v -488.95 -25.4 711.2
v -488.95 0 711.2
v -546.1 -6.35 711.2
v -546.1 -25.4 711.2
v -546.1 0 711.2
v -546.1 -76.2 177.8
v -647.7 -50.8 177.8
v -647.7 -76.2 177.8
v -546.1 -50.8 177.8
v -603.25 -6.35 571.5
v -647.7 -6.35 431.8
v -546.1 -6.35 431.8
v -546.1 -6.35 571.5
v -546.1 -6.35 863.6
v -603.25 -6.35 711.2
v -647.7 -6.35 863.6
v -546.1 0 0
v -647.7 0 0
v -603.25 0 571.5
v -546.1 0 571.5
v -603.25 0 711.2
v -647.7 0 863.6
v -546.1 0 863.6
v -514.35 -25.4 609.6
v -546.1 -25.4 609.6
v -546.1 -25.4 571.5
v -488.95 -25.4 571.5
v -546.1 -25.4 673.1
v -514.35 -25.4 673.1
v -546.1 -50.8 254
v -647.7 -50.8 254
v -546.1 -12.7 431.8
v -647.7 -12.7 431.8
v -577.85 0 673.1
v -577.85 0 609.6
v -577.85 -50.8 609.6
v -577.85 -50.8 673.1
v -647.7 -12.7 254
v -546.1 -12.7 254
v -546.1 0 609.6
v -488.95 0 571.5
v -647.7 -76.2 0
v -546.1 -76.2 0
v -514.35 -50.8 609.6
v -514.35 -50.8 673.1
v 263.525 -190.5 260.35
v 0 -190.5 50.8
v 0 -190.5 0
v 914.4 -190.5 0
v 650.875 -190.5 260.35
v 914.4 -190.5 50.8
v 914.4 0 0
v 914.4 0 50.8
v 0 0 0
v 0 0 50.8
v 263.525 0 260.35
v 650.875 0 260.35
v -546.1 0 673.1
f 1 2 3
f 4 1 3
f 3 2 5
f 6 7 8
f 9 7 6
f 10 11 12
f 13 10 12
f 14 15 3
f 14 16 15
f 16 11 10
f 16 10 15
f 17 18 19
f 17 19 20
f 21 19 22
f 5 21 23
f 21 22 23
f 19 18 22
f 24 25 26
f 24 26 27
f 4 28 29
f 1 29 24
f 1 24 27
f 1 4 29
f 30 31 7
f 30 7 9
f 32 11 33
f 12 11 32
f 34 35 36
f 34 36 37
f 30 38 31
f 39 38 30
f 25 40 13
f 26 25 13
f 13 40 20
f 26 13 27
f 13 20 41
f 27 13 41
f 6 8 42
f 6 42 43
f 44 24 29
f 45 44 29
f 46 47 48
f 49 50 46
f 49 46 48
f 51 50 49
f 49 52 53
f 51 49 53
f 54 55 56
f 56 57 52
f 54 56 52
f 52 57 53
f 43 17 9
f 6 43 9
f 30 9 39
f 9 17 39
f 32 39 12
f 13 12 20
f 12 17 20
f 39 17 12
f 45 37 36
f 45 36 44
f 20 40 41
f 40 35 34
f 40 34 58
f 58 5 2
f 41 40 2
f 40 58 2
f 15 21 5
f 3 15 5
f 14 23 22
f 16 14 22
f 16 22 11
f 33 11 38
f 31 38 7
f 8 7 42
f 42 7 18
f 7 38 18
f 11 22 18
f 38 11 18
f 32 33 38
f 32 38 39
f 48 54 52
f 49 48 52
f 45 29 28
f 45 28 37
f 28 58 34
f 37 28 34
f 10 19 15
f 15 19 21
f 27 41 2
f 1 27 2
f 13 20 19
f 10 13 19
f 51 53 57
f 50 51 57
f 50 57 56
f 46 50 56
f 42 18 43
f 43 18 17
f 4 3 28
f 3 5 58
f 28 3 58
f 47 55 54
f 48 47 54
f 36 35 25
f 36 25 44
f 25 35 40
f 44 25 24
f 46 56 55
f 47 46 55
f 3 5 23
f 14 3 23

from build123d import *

# Parameters (mm, degrees)
F1_DEPTH = 190.5
F0_W     = 101.6
F0_H     = 177.8
F2_DEPTH = 76.2
F0_H_2   = 76.2
F3_DEPTH = 50.8
F4_DEPTH = 12.7
F5_DEPTH = 6.35
F0_W_2   = 31.75
F0_H_3   = 63.5
F6_DEPTH = 50.8
F7_DEPTH = 25.4


with BuildPart() as f1:
    # F0 (on Front) → F1 (new body)
    with BuildSketch(Plane.XZ):
        Polygon((0, 50.8), (0, 0), (914.4, 0), (914.4, 50.8), (650.875, 260.35), (263.525, 260.35), align=None)
    extrude(amount=F1_DEPTH)


with BuildPart() as f2:
    # F0 (on Front) → F2 (new body)
    with BuildSketch(Plane.XZ):
        with Locations((-596.9, 88.9)):
            Rectangle(F0_W, F0_H)
    extrude(amount=F2_DEPTH)

    # F0 (on Front) → F3 (join)
    with BuildSketch(Plane.XZ):
        with Locations((-596.9, 215.9)):
            Rectangle(F0_W, F0_H_2)
    extrude(amount=F3_DEPTH)

    # F0 (on Front) → F4 (join)
    with BuildSketch(Plane.XZ):
        with Locations((-596.9, 342.9)):
            Rectangle(F0_W, F0_H)
    extrude(amount=F4_DEPTH)

    # F0 (on Front) → F5 (join)
    with BuildSketch(Plane.XZ):
        Polygon((-647.7, 431.8), (-546.1, 431.8), (-546.1, 571.5), (-603.25, 571.5), (-603.25, 711.2), (-546.1, 711.2), (-546.1, 863.6), (-647.7, 863.6), align=None)
    extrude(amount=F5_DEPTH)



with BuildPart() as f6:
    # F0 (on Front) → F6 (new body)
    with BuildSketch(Plane.XZ):
        with Locations((-530.225, 641.35)):
            Rectangle(F0_W_2, F0_H_3)
        with Locations((-561.975, 641.35)):
            Rectangle(F0_W_2, F0_H_3)
    extrude(amount=F6_DEPTH)


with BuildPart() as f2_1:
    add(f2.part)

    add(f6.part)  # F7 merges F6
    # F0 (on Front) → F7 (join)
    with BuildSketch(Plane.XZ):
        Polygon((-546.1, 609.6), (-546.1, 571.5), (-488.95, 571.5), (-488.95, 711.2), (-546.1, 711.2), (-546.1, 673.1), (-514.35, 673.1), (-514.35, 609.6), align=None)
    extrude(amount=F7_DEPTH)


solid = Compound([f1.part, f2_1.part])
